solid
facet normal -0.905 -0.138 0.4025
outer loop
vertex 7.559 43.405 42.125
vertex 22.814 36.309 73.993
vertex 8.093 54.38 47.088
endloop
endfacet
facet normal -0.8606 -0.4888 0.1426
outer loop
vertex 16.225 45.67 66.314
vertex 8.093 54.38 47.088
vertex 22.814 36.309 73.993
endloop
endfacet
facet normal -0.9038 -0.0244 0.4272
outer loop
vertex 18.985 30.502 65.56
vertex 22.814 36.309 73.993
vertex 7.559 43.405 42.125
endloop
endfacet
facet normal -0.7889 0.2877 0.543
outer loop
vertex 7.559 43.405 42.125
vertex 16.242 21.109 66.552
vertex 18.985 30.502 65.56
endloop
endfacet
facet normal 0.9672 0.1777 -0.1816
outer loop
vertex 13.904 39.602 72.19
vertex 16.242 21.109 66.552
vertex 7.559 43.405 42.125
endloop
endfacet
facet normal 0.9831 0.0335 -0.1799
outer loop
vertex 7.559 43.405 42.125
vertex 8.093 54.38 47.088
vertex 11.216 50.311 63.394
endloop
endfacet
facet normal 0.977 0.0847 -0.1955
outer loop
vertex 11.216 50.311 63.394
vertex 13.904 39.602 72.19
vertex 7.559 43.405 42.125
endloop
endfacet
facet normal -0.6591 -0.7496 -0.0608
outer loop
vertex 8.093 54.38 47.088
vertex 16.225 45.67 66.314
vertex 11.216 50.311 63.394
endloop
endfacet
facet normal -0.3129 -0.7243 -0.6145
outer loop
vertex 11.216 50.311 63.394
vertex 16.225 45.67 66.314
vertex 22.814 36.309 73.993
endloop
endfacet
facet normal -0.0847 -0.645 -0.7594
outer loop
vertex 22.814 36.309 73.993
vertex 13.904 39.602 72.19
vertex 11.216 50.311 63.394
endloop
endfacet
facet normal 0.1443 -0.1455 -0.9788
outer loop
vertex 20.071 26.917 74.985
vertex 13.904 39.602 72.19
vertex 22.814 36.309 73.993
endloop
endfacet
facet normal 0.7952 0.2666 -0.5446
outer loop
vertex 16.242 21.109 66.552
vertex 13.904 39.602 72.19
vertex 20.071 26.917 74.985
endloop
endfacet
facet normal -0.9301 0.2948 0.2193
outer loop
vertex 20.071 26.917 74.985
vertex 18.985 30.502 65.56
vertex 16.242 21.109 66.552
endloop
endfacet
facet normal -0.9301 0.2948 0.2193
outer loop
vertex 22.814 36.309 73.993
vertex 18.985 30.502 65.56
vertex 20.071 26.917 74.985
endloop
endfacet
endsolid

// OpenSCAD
// Auto-generated auxetic polyhedron
points = [
    [8.093019, 54.379506, 47.087789],
    [22.813904, 36.309331, 73.992990],
    [7.559356, 43.404779, 42.125124],
    [16.224862, 45.670303, 66.313827],
    [18.984943, 30.501584, 65.559857],
    [16.242278, 21.109075, 66.552211],
    [13.903940, 39.601526, 72.189839],
    [11.215908, 50.310784, 63.394087],
    [20.071239, 26.916823, 74.985344],
];

faces = [
    [0, 1, 2],
    [1, 0, 3],
    [2, 1, 4],
    [4, 5, 2],
    [2, 5, 6],
    [7, 0, 2],
    [2, 6, 7],
    [7, 3, 0],
    [1, 3, 7],
    [7, 6, 1],
    [1, 6, 8],
    [8, 6, 5],
    [5, 4, 8],
    [8, 4, 1],
];

polyhedron(points = points, faces = faces);
